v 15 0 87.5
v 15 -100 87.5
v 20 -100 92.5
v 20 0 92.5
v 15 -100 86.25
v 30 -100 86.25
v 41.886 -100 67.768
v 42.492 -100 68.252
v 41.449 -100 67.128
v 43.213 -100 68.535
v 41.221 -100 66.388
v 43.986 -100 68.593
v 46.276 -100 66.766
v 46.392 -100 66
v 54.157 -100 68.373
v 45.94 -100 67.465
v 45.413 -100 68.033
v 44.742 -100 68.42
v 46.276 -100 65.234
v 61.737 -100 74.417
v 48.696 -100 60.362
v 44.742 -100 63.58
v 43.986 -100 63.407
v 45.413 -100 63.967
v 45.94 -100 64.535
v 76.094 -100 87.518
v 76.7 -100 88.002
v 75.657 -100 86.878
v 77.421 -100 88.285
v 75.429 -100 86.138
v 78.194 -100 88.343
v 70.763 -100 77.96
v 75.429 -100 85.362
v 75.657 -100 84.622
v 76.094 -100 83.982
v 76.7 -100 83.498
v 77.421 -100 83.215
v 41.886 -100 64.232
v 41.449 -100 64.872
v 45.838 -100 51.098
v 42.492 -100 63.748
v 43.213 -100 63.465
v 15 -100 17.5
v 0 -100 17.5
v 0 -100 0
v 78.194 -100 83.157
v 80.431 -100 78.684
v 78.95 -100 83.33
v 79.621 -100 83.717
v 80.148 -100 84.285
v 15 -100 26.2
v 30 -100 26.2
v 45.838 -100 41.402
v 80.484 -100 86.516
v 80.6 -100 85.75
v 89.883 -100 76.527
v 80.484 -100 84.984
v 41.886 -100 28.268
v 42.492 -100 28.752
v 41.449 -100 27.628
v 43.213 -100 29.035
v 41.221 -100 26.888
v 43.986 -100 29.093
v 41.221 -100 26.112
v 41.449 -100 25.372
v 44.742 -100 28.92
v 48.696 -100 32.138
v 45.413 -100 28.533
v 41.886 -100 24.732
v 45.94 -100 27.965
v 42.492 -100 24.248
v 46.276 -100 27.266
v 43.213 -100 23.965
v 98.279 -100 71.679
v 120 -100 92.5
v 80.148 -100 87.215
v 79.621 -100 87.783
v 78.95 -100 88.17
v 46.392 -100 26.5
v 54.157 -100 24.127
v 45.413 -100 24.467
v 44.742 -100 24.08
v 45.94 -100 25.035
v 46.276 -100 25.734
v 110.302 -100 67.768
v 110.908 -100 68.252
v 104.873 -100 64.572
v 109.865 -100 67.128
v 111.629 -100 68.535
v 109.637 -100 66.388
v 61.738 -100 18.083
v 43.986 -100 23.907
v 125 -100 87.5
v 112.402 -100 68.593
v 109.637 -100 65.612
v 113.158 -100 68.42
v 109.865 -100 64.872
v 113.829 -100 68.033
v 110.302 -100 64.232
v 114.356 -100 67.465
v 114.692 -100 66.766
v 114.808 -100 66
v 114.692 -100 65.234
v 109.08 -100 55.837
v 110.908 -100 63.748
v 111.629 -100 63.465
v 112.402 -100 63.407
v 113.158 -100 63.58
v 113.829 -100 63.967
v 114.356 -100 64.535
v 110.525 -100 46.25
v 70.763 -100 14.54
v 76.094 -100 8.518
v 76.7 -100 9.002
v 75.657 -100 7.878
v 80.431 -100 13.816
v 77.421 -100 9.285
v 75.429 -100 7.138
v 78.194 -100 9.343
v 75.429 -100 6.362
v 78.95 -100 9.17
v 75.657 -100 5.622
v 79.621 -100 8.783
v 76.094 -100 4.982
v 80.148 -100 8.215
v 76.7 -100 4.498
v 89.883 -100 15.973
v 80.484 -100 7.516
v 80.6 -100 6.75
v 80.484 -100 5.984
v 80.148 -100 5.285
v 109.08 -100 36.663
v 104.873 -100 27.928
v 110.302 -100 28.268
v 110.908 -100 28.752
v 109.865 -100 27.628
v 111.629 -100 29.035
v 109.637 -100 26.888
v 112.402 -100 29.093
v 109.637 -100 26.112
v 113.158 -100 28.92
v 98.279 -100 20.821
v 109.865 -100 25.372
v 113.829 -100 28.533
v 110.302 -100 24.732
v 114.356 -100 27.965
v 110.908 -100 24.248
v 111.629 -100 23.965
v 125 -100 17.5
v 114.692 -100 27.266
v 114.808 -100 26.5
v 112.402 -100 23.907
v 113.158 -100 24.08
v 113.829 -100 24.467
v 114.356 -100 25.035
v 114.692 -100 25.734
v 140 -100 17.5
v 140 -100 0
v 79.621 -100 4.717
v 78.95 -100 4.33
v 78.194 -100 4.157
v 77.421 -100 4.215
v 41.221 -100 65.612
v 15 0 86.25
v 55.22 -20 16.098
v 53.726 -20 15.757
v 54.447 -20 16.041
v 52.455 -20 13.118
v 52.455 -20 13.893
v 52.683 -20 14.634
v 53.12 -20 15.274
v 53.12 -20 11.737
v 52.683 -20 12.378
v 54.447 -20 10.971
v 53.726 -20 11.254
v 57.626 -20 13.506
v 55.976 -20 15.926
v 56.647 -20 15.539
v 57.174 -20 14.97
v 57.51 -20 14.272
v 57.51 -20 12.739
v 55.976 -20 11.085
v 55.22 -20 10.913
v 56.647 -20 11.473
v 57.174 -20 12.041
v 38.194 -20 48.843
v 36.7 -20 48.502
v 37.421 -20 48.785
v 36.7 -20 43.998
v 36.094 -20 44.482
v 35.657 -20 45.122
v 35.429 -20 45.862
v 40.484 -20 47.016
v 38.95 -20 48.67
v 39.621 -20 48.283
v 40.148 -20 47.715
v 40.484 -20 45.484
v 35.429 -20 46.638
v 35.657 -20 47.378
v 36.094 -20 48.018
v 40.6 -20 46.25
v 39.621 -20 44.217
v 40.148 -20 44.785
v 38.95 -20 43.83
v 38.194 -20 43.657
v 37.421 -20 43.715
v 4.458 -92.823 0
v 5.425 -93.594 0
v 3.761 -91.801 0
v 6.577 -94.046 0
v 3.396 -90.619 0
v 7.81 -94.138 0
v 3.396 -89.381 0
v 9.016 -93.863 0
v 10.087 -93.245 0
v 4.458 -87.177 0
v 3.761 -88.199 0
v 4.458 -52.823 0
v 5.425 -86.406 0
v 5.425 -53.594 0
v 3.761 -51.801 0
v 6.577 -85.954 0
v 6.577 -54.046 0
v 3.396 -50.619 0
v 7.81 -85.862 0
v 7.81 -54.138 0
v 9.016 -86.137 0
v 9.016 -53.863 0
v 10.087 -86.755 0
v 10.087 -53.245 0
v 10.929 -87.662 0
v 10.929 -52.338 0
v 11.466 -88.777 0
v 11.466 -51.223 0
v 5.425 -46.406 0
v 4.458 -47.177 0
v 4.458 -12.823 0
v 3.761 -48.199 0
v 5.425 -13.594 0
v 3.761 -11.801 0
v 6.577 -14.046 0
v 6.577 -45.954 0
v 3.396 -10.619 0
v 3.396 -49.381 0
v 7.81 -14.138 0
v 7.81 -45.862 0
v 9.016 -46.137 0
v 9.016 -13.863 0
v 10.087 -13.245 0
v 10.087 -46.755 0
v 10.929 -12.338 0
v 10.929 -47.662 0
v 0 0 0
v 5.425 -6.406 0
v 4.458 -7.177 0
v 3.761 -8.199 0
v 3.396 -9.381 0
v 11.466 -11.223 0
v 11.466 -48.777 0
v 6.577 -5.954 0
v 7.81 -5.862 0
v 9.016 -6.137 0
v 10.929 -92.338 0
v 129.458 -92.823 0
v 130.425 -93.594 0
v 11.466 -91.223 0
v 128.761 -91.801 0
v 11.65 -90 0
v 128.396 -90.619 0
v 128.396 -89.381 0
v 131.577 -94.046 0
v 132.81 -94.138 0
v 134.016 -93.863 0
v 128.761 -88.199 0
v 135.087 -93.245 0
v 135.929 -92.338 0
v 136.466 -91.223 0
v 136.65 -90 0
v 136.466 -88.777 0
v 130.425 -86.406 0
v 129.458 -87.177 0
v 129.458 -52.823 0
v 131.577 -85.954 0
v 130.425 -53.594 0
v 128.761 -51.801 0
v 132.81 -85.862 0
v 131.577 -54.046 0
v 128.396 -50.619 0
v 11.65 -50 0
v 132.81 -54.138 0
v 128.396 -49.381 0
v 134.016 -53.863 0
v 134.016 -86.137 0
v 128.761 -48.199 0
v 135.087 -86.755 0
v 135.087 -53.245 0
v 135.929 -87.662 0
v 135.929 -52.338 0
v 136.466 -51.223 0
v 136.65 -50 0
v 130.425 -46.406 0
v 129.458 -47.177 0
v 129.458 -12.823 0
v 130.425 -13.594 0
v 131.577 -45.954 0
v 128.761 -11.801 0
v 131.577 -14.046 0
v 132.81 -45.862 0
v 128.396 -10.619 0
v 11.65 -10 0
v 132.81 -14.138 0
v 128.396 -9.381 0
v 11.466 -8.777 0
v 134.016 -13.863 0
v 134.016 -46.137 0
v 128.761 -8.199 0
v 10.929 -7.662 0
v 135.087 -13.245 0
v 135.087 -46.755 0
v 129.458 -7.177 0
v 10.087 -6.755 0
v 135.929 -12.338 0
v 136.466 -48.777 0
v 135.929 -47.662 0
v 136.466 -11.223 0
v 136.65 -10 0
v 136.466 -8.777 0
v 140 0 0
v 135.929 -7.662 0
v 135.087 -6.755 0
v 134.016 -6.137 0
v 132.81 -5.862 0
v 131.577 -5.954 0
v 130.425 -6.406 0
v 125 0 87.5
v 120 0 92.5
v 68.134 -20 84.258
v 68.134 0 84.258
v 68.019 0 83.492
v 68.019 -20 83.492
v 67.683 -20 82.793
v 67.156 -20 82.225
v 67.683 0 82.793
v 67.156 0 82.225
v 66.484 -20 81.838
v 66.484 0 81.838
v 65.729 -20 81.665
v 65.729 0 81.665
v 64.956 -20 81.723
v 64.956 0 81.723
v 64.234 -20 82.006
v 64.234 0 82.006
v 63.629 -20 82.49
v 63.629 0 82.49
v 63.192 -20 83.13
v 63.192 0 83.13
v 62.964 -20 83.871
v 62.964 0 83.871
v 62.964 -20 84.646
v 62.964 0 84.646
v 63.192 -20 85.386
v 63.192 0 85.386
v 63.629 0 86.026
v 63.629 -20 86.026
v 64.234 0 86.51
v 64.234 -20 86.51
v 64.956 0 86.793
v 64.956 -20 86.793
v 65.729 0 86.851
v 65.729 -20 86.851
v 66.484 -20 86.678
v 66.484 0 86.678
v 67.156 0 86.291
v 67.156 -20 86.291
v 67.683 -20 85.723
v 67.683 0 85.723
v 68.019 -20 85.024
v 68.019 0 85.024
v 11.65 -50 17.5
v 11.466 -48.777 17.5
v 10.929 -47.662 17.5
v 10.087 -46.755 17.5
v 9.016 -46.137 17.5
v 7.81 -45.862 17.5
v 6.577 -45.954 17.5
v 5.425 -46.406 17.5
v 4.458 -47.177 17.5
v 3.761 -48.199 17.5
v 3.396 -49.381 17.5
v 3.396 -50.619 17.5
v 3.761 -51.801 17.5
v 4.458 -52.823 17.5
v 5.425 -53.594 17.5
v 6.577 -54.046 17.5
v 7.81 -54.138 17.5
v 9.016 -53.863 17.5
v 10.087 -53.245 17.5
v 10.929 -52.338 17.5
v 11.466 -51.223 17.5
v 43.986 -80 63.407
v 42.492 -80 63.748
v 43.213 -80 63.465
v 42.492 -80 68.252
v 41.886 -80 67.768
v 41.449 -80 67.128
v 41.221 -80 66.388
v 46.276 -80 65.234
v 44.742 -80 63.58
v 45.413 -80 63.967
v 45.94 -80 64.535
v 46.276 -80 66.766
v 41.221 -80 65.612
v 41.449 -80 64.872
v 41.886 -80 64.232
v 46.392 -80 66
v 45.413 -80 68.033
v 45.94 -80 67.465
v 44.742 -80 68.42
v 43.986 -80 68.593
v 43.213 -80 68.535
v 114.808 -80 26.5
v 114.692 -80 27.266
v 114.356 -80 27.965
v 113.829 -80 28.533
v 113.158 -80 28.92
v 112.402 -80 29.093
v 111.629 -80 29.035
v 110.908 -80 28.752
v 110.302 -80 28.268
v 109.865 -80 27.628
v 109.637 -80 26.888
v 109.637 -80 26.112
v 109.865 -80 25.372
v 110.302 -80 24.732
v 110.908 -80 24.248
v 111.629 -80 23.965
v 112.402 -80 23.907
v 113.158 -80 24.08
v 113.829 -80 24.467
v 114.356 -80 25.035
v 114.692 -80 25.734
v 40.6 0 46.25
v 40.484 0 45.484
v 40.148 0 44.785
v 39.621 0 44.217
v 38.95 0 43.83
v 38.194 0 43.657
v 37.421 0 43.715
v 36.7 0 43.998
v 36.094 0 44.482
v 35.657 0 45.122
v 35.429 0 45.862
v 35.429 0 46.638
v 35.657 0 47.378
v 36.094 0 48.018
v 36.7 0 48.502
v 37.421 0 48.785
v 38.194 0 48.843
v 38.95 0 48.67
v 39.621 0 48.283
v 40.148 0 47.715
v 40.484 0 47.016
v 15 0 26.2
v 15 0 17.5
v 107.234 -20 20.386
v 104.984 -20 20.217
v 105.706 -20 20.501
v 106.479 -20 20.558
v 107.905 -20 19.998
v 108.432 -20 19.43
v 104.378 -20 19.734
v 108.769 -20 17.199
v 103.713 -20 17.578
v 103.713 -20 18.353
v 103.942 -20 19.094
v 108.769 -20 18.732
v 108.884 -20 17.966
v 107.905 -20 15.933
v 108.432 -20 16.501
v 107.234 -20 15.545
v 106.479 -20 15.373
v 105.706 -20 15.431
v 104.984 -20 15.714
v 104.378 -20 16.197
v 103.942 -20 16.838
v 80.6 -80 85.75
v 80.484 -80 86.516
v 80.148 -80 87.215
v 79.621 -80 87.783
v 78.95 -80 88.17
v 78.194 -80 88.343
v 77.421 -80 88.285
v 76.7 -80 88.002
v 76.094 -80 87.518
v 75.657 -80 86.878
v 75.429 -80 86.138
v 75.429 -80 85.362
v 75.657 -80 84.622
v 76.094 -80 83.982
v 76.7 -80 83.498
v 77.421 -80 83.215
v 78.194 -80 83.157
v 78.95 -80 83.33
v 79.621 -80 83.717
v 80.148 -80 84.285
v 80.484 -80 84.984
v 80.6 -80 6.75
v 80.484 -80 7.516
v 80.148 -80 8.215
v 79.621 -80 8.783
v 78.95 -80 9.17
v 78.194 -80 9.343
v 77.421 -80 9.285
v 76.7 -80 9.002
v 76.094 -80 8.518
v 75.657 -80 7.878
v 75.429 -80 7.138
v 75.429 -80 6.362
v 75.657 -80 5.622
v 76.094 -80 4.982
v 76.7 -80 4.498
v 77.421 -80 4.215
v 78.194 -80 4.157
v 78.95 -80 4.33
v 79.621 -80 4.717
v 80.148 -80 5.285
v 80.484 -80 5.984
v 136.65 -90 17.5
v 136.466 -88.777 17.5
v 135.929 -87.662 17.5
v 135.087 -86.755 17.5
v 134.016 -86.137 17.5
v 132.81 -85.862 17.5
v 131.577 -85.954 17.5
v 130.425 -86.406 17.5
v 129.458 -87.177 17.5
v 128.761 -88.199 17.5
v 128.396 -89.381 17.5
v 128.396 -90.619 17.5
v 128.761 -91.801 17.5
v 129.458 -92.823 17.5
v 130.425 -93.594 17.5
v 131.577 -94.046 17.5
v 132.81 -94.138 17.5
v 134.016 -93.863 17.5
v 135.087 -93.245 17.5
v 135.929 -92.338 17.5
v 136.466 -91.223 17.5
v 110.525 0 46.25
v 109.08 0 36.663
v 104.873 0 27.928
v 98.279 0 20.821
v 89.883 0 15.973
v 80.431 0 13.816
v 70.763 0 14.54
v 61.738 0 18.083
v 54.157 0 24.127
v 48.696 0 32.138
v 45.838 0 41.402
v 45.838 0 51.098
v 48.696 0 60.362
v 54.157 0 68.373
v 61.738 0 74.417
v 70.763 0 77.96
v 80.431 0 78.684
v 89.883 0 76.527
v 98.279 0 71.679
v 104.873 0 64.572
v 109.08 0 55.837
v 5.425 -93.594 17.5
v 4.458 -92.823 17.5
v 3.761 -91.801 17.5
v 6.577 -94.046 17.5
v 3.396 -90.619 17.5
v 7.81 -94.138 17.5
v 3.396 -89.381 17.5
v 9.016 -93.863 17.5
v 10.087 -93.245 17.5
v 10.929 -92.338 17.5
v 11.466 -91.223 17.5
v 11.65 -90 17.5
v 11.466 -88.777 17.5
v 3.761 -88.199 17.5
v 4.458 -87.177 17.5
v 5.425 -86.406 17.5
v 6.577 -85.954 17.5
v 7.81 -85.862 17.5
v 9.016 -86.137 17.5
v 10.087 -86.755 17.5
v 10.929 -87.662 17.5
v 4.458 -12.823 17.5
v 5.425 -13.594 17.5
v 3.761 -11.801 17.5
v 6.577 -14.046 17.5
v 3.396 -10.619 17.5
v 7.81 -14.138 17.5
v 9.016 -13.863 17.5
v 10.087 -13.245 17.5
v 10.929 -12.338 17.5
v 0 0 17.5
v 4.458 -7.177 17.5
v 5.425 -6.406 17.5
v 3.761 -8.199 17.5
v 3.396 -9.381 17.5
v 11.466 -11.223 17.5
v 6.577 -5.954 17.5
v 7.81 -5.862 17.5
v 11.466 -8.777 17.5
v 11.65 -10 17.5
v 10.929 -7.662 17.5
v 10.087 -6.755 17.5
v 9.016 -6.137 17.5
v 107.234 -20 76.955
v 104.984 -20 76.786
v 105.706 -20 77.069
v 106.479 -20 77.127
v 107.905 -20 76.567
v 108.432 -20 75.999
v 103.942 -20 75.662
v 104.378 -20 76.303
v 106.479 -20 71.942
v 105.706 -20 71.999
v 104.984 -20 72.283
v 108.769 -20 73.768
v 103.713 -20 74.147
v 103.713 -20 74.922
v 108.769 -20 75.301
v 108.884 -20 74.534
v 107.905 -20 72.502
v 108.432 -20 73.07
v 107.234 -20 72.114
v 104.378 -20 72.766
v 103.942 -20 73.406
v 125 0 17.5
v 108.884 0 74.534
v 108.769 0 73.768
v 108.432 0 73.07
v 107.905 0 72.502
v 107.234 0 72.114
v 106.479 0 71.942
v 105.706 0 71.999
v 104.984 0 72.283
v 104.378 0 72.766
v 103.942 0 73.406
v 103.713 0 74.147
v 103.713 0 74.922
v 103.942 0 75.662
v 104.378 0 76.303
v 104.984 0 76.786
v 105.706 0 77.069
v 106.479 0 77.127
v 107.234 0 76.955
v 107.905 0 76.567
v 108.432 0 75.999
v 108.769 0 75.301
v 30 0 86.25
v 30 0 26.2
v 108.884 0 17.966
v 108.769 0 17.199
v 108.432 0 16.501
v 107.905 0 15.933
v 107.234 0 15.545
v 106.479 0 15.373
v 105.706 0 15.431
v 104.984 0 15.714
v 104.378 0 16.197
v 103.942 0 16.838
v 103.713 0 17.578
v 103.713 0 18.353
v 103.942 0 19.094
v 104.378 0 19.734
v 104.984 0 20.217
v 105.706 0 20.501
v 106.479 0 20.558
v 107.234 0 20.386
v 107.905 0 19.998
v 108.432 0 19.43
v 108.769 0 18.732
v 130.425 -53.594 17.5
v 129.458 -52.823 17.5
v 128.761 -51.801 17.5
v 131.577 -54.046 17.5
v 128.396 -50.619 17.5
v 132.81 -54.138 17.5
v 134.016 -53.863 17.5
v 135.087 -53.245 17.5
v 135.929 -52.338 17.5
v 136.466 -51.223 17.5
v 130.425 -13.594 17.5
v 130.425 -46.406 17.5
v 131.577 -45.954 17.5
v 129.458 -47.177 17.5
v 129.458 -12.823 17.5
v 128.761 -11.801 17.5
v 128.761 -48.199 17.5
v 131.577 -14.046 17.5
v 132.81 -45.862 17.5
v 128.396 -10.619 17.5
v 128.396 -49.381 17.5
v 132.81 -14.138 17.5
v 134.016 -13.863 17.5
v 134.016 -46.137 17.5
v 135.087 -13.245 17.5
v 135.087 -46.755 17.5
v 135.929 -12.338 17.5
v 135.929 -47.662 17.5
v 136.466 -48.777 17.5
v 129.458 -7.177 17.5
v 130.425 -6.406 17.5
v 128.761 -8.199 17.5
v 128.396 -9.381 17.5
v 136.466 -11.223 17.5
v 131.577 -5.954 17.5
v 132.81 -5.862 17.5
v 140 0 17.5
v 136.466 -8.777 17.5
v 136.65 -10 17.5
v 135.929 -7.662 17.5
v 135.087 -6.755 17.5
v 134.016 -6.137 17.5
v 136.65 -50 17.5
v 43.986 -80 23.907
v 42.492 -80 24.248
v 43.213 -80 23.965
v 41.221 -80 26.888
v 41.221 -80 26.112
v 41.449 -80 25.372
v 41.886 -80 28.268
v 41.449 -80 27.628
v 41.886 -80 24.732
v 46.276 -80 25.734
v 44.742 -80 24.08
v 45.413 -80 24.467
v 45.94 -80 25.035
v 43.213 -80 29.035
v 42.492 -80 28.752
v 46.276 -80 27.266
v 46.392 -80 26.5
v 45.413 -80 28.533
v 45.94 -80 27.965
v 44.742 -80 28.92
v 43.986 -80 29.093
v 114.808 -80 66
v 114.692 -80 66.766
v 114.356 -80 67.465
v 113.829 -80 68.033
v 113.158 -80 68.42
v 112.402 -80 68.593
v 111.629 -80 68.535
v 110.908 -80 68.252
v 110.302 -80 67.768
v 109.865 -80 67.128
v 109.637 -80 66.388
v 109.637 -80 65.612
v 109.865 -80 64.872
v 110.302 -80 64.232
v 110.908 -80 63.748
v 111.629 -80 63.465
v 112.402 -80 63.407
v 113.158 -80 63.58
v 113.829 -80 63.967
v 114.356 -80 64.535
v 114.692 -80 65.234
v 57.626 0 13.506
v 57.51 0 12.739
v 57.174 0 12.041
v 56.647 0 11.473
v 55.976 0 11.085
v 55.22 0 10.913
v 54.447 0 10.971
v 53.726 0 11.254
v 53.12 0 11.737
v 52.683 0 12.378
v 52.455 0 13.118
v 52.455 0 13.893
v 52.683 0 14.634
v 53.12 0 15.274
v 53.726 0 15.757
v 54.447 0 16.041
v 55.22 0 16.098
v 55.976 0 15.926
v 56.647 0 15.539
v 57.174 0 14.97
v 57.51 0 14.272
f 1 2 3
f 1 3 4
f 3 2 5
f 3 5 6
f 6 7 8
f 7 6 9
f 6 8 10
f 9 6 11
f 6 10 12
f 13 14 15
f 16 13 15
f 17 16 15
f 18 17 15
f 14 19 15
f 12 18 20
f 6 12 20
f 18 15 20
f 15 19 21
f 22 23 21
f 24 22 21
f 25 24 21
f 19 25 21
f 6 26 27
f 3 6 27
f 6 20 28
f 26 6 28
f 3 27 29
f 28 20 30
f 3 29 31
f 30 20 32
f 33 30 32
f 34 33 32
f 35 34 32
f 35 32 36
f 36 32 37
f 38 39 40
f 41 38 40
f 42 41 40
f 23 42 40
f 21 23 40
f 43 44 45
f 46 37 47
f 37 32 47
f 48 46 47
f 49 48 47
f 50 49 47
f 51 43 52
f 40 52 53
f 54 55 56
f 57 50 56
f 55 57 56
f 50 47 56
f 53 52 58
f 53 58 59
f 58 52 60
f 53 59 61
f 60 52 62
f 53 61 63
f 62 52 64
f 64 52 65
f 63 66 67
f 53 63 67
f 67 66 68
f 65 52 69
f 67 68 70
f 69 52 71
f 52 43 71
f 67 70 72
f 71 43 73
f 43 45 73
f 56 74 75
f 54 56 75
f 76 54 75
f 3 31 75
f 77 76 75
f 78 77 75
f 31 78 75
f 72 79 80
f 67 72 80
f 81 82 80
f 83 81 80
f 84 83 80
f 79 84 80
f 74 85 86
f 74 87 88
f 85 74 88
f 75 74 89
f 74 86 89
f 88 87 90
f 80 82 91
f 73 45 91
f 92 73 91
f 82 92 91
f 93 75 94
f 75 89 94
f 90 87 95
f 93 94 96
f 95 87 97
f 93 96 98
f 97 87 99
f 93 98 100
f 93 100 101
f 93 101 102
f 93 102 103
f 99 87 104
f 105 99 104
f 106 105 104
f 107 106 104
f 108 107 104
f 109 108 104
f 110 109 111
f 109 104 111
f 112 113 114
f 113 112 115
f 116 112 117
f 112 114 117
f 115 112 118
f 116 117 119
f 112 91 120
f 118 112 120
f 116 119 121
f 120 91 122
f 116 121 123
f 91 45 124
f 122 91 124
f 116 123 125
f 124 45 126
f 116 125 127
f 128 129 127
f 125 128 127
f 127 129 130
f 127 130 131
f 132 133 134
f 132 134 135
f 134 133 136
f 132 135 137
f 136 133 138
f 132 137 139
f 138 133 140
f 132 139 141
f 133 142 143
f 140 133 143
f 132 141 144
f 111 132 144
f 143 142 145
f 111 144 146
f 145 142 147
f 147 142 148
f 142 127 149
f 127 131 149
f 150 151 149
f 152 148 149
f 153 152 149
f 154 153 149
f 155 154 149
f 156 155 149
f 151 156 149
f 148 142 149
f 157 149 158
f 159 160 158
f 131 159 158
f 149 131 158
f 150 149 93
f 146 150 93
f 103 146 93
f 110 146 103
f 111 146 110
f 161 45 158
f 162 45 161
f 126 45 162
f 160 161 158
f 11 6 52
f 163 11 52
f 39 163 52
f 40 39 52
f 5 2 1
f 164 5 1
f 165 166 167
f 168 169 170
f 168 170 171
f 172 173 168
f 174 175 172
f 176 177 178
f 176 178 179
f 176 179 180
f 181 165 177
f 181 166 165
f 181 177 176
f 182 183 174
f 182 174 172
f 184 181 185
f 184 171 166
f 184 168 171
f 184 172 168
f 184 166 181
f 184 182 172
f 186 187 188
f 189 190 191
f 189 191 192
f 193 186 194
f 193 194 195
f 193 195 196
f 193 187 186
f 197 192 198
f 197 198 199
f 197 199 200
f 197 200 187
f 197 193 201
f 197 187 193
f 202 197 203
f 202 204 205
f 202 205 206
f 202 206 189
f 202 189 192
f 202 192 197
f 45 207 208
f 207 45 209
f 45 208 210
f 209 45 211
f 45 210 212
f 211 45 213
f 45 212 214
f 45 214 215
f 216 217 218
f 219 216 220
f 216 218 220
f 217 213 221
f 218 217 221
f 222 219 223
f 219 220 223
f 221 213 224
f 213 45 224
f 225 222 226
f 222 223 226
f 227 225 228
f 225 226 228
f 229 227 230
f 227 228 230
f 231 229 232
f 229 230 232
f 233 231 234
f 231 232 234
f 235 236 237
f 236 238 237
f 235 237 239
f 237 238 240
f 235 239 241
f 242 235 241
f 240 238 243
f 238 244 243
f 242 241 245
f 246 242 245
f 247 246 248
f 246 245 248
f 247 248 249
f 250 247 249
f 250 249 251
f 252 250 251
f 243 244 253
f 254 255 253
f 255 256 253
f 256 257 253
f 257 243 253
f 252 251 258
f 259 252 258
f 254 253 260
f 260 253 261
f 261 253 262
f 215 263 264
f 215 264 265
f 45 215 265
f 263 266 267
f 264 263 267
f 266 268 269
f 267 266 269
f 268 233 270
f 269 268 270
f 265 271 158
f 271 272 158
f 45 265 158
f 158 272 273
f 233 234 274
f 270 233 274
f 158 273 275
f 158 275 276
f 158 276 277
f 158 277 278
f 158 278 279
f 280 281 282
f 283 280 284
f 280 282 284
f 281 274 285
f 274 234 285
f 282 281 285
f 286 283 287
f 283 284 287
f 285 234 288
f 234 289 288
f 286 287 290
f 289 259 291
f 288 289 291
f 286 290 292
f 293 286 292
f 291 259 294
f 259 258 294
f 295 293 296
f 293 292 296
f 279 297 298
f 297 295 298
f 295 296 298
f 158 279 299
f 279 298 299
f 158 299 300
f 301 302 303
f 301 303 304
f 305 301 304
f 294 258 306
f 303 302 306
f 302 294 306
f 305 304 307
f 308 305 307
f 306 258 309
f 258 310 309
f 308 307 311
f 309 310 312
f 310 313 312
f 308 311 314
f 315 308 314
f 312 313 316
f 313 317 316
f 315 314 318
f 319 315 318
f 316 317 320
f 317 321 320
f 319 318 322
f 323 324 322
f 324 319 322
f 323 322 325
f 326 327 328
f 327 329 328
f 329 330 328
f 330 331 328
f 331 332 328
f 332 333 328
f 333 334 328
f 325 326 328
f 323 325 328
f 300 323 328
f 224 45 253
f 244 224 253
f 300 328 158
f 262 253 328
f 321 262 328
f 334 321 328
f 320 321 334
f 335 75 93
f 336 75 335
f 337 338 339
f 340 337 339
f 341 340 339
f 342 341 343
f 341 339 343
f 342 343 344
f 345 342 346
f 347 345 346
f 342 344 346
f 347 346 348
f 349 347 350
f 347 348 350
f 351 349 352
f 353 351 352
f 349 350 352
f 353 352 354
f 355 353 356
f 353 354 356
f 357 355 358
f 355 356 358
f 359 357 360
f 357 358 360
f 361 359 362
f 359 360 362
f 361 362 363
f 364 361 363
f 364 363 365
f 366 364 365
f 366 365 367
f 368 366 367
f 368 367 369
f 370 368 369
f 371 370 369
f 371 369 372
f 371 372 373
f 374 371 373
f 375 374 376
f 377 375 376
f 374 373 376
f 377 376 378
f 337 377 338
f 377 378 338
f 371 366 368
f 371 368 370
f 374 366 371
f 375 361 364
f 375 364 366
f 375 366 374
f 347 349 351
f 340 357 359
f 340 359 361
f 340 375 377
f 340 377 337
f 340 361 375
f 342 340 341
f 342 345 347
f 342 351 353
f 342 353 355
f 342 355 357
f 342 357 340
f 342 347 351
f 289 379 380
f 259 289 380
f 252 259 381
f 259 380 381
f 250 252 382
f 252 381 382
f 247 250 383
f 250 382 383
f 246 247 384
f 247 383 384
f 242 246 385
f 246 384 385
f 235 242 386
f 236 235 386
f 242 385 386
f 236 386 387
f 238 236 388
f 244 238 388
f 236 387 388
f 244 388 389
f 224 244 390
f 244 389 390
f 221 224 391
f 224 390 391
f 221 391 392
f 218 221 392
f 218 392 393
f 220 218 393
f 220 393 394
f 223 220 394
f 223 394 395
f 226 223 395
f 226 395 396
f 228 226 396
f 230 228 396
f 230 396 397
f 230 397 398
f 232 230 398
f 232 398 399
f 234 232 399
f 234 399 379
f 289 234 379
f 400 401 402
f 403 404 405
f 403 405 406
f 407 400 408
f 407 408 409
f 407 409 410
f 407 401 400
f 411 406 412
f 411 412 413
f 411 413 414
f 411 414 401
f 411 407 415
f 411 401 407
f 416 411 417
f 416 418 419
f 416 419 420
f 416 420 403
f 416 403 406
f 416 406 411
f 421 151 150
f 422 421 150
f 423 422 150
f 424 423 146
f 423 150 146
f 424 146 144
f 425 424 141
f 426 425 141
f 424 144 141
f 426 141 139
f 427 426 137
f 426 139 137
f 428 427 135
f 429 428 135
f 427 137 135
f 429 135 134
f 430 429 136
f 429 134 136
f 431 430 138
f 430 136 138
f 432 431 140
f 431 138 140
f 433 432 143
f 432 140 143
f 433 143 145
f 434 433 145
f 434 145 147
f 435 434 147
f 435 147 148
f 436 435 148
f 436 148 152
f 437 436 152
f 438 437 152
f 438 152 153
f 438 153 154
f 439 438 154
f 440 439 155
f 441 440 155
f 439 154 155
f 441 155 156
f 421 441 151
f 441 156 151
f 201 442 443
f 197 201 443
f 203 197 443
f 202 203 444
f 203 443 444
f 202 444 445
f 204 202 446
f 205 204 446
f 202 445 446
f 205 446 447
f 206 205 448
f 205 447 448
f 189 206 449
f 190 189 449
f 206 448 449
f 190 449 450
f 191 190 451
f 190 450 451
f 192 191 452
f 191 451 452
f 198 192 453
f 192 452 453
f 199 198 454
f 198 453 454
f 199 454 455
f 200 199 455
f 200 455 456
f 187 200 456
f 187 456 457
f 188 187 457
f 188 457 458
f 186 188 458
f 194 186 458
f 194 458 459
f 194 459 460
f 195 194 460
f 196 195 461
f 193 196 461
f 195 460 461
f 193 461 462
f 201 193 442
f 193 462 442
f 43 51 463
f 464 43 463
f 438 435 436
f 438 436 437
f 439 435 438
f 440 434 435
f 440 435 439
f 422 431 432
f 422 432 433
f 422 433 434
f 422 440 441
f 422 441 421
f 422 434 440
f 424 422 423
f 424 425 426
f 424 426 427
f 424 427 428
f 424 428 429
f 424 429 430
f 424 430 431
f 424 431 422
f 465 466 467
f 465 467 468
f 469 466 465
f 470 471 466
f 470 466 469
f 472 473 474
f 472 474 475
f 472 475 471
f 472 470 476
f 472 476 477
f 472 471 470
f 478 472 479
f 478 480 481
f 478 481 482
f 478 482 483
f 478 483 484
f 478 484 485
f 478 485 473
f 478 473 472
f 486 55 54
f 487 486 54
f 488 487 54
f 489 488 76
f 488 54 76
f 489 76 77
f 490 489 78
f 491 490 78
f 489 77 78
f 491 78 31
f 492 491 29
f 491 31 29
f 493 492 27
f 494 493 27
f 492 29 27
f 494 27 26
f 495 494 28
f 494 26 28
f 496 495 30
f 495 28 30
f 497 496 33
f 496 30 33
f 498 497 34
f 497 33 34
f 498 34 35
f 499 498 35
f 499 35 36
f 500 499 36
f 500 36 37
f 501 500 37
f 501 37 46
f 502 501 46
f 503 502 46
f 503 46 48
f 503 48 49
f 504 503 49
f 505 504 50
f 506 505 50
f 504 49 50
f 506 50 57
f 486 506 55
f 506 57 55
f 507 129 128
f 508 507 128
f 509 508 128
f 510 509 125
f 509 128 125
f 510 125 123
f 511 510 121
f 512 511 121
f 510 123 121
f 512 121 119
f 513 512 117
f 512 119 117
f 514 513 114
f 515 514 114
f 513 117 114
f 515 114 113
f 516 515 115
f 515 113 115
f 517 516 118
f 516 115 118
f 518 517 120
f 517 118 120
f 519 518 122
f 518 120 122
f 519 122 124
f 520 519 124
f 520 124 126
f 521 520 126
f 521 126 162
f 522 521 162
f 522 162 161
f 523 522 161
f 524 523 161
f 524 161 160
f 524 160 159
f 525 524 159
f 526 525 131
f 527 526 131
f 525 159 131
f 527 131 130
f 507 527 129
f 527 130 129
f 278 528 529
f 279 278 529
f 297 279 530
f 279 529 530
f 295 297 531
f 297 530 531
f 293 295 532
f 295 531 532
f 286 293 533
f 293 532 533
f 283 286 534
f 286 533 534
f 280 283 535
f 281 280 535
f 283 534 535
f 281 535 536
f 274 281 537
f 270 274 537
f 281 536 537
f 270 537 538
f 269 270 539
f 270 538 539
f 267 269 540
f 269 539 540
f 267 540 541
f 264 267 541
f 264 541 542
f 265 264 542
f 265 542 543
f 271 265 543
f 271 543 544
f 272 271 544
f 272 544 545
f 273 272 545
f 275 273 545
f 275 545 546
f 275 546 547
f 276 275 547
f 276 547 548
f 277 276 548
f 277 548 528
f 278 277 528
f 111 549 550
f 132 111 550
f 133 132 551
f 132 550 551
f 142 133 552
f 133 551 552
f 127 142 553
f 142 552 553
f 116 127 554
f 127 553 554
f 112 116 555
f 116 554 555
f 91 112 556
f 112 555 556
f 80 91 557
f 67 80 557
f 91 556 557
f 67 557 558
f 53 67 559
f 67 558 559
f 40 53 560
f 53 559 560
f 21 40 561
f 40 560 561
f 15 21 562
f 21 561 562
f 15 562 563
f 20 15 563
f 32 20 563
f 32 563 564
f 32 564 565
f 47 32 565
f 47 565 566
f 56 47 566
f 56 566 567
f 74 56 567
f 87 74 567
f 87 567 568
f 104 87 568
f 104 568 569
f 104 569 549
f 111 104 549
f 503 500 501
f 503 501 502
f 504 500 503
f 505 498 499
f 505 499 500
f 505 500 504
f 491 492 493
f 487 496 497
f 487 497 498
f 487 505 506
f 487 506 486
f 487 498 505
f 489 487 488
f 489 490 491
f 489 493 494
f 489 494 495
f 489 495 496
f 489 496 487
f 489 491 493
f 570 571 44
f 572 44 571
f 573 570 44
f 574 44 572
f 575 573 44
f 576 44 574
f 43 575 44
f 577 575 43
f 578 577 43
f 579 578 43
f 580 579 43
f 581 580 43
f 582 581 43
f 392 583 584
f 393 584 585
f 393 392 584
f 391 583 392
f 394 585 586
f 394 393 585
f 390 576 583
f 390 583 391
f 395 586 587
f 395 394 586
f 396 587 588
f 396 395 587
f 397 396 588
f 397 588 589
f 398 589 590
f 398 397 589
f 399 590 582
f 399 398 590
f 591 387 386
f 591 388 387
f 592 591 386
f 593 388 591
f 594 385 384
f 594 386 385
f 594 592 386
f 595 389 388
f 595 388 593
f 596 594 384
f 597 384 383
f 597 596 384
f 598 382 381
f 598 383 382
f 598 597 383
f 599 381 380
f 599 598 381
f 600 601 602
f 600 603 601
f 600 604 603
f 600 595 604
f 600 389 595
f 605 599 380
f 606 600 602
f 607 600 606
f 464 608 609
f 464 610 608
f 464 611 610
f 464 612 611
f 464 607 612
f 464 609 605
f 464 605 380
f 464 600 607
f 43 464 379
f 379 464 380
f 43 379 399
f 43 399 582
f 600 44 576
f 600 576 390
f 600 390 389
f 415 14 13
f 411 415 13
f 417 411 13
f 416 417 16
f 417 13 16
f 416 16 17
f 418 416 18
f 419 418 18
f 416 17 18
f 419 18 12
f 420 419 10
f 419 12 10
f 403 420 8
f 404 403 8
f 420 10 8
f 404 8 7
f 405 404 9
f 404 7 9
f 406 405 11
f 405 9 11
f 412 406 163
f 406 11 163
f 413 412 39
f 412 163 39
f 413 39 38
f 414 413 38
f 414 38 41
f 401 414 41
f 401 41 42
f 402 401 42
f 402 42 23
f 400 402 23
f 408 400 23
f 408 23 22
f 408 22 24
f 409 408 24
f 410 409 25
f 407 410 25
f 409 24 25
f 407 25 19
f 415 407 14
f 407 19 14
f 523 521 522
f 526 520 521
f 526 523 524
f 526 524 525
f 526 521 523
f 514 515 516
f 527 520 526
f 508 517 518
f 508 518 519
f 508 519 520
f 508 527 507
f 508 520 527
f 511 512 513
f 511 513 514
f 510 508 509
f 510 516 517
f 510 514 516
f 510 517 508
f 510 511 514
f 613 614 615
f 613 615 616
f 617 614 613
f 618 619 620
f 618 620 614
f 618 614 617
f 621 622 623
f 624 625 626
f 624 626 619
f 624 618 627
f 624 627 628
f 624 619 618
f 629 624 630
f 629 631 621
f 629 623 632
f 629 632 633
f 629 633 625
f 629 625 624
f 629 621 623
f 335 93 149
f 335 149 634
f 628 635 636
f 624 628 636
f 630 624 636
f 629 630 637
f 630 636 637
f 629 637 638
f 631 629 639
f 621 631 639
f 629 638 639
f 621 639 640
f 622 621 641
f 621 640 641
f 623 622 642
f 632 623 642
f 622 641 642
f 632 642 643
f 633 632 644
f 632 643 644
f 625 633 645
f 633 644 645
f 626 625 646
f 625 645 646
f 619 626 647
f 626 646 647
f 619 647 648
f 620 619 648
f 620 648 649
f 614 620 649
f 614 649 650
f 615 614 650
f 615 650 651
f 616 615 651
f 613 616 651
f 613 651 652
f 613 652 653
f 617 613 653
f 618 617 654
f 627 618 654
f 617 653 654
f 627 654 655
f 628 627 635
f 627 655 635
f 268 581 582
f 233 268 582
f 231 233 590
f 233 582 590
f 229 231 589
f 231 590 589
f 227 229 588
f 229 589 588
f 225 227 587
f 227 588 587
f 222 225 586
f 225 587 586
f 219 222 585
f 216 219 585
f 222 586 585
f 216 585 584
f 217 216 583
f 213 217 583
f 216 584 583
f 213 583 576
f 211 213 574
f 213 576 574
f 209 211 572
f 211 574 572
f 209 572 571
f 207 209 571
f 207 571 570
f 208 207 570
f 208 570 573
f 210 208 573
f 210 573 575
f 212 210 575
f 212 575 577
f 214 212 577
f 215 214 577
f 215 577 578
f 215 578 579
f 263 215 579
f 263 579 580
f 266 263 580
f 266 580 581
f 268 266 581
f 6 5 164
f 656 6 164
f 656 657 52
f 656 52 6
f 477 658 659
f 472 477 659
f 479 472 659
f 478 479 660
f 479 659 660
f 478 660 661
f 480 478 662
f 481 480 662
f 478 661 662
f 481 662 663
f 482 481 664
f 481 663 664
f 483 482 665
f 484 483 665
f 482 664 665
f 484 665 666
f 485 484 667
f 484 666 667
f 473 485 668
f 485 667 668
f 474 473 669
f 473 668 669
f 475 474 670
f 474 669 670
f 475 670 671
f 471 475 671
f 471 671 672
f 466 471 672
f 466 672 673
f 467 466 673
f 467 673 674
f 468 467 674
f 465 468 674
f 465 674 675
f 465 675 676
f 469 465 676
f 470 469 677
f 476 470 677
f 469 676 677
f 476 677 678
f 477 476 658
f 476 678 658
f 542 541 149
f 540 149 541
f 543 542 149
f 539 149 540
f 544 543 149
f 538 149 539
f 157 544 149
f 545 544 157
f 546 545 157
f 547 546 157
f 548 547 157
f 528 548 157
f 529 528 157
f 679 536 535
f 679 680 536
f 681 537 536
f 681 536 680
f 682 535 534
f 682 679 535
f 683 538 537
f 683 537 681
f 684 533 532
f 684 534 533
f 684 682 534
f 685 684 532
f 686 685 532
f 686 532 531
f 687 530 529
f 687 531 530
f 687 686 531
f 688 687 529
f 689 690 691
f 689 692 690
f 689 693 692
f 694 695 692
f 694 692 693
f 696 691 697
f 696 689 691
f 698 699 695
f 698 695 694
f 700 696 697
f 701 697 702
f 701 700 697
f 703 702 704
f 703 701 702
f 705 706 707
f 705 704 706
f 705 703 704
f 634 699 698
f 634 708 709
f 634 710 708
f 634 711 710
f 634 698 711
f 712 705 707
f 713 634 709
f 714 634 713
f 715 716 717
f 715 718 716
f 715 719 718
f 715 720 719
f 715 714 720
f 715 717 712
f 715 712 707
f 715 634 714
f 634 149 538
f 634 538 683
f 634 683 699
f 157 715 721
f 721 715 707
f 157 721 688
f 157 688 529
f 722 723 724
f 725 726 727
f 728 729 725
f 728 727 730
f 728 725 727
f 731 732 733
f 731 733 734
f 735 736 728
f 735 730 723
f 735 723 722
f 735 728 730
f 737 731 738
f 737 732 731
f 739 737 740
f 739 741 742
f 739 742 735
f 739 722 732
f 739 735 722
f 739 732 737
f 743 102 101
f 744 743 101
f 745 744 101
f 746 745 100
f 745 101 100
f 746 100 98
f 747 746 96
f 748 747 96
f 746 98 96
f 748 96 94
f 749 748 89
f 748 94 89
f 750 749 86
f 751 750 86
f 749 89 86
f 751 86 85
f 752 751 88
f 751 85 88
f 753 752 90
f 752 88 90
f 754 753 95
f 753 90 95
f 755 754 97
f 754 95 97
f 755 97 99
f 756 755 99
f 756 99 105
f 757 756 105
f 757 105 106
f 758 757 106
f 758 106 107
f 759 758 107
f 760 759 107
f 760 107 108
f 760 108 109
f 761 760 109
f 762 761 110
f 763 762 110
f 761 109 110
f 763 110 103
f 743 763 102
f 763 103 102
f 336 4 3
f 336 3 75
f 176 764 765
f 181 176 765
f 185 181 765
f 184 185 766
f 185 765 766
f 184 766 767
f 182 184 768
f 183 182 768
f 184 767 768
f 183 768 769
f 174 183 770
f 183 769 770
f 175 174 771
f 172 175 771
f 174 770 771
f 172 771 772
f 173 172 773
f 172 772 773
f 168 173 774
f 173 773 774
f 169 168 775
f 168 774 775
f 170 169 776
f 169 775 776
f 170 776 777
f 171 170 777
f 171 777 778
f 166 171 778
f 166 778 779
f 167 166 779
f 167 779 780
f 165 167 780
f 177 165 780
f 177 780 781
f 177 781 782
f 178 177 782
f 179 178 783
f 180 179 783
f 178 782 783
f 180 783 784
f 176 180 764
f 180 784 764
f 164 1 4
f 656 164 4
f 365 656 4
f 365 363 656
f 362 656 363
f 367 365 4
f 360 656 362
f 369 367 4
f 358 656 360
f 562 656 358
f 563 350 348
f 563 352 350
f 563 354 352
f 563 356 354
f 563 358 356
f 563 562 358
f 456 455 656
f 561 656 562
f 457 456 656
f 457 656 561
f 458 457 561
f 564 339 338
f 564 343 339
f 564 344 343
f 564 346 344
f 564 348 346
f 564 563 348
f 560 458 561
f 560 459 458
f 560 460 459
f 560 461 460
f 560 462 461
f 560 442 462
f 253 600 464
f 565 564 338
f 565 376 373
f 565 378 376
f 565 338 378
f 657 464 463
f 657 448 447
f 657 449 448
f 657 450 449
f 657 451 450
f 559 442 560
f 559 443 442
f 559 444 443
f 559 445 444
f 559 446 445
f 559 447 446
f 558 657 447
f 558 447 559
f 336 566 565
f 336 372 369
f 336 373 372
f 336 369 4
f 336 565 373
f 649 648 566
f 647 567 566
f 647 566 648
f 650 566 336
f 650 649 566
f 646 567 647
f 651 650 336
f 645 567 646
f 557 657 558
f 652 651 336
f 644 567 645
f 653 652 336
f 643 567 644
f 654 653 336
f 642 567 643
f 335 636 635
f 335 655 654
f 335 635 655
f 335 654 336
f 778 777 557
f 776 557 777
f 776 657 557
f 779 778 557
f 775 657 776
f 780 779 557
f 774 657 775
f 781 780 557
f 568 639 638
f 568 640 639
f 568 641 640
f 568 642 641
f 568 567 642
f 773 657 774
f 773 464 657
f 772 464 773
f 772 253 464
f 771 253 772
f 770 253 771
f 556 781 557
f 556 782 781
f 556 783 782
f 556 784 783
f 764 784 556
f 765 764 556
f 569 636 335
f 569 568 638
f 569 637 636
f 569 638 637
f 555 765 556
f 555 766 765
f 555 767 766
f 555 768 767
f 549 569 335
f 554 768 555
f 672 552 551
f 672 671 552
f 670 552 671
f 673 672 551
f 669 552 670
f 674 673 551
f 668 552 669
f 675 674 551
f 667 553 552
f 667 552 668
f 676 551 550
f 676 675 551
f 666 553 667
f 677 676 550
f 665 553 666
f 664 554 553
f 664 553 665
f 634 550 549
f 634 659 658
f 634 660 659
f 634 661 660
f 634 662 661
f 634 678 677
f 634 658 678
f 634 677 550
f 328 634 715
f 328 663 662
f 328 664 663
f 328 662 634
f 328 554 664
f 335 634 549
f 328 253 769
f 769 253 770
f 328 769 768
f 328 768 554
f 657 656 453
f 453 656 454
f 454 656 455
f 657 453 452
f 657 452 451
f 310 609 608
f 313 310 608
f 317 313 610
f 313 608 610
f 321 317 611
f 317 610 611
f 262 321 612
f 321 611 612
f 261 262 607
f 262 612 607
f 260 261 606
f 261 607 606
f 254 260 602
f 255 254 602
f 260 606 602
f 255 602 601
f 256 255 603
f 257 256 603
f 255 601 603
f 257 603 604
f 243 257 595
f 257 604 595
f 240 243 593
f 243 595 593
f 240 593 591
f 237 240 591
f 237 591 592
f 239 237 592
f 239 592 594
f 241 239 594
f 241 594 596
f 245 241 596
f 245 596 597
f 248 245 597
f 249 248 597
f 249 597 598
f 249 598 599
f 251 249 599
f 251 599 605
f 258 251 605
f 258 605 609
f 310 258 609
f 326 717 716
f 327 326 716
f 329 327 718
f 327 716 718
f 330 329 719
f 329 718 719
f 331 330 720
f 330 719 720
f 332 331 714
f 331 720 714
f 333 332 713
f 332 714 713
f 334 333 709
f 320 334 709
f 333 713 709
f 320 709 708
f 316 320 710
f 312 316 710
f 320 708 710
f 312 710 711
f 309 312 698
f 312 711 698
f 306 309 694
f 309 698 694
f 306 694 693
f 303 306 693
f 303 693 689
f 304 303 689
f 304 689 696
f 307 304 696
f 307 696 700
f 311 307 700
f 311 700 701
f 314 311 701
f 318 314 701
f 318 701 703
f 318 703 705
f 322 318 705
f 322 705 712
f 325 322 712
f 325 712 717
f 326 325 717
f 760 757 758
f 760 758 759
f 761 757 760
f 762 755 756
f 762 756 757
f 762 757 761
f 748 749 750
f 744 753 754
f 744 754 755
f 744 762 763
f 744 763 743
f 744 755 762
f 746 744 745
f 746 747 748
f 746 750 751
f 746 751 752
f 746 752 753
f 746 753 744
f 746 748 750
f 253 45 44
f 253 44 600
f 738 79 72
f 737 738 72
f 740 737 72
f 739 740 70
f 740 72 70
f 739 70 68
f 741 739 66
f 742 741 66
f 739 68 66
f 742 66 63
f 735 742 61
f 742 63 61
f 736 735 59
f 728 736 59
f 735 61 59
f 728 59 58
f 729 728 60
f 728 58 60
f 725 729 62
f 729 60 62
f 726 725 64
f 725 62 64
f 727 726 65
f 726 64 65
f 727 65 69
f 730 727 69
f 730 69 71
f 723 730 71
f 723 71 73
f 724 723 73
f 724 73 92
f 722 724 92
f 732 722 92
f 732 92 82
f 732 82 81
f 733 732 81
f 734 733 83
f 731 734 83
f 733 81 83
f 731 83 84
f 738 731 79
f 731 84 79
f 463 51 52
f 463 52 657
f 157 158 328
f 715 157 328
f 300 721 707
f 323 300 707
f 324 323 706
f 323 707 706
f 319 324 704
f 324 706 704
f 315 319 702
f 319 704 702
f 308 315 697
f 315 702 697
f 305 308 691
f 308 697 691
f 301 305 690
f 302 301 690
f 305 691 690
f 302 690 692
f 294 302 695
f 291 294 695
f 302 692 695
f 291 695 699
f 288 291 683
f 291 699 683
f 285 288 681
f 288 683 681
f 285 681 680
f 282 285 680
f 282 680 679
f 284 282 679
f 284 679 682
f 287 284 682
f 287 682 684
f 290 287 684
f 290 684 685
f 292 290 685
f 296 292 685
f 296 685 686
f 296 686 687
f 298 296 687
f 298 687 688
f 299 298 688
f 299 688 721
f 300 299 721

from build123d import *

# Parameters (mm, degrees)
SKETCH_1_W           = 140
SKETCH_1_H           = 100
EXTRUDE_1_DEPTH      = 92.5
SKETCH_2_R           = 32.525
CUT_EXTRUDE_1_DEPTH  = 101
SKETCH_3_OUTSIDE_W   = 181.068
SKETCH_3_OUTSIDE_H   = 141.068
SKETCH_3_OUTSIDE_W_2 = 110
SKETCH_3_OUTSIDE_H_2 = 100
CUT_EXTRUDE_2_DEPTH  = 75
SKETCH_5_W           = 60.05
SKETCH_5_H           = 100
CUT_EXTRUDE_3_DEPTH  = 15
CHAMFER_2_SIZE       = 5
SKETCH_6_R           = 2.6
CUT_EXTRUDE_4_DEPTH  = 20
SKETCH_9_R           = 4.15
CUT_EXTRUDE_5_DEPTH  = 18.5
SKETCH_10_R          = 2.6
CUT_EXTRUDE_6_DEPTH  = 20


with BuildPart() as part:
    # 草图1 → 凸台-拉伸1 (new body)
    with BuildSketch(Plane.XY):
        with Locations((70, -50)):
            Rectangle(SKETCH_1_W, SKETCH_1_H)
    extrude(amount=EXTRUDE_1_DEPTH)

    # 草图2 → 切除-拉伸1 (cut, through all)
    with BuildSketch(Plane(origin=(0, 0, 0), x_dir=(1, 0, 0), z_dir=(0, 1, 0))):
        with Locations((78, -46.25)):
            Circle(SKETCH_2_R)
    extrude(amount=-CUT_EXTRUDE_1_DEPTH, mode=Mode.SUBTRACT)

    # 草图3 outside → 切除-拉伸2 (cut)
    with BuildSketch(Plane.XY.offset(92.5)):
        with Locations((70, -50)):
            Rectangle(SKETCH_3_OUTSIDE_W, SKETCH_3_OUTSIDE_H)
        with Locations((70, -50)):
            Rectangle(SKETCH_3_OUTSIDE_W_2, SKETCH_3_OUTSIDE_H_2, mode=Mode.SUBTRACT)
    extrude(amount=-CUT_EXTRUDE_2_DEPTH, mode=Mode.SUBTRACT)

    # 草图5 → 切除-拉伸3 (cut)
    with BuildSketch(Plane.ZY.offset(-15)):
        with Locations((56.225, -50)):
            Rectangle(SKETCH_5_W, SKETCH_5_H)
    extrude(amount=-CUT_EXTRUDE_3_DEPTH, mode=Mode.SUBTRACT)

    # 倒角2
    chamfer_2_edges = [part.edges().sort_by_distance(p)[0] for p in [
        (15, -50, 92.5),
        (125, -50, 92.5),
    ]]
    chamfer(chamfer_2_edges, length=CHAMFER_2_SIZE)

    # 草图6 → 切除-拉伸4 (cut)
    with BuildSketch(Plane.XZ.offset(100)):
        with Locations((78, 85.75)):
            Circle(SKETCH_6_R)
        with Locations((112.208003449, 66)):
            Circle(SKETCH_6_R)
        with Locations((112.208003449, 26.5)):
            Circle(SKETCH_6_R)
        with Locations((78, 6.75)):
            Circle(SKETCH_6_R)
        with Locations((43.791996551, 26.5)):
            Circle(SKETCH_6_R)
        with Locations((43.791996551, 66)):
            Circle(SKETCH_6_R)
    extrude(amount=-CUT_EXTRUDE_4_DEPTH, mode=Mode.SUBTRACT)

    # 草图9 → 切除-拉伸5 (cut, through all)
    with BuildSketch(Plane.XY.offset(17.5)):
        with Locations((7.5, -10)):
            Circle(SKETCH_9_R)
        with Locations((132.5, -10)):
            Circle(SKETCH_9_R)
        with Locations((132.5, -50)):
            Circle(SKETCH_9_R)
        with Locations((132.5, -90)):
            Circle(SKETCH_9_R)
        with Locations((7.5, -50)):
            Circle(SKETCH_9_R)
        with Locations((7.5, -90)):
            Circle(SKETCH_9_R)
    extrude(amount=-CUT_EXTRUDE_5_DEPTH, mode=Mode.SUBTRACT)

    # 草图10 → 切除-拉伸6 (cut)
    with BuildSketch(Plane(origin=(0, 0, 0), x_dir=(1, 0, 0), z_dir=(0, 1, 0))):
        with Locations((106.284271247, -17.965728753)):
            Circle(SKETCH_10_R)
        with Locations((106.284271247, -74.534271247)):
            Circle(SKETCH_10_R)
        with Locations((38, -46.25)):
            Circle(SKETCH_10_R)
        with Locations((65.534490363, -84.258039538)):
            Circle(SKETCH_10_R)
        with Locations((55.025808003, -13.505740929)):
            Circle(SKETCH_10_R)
    extrude(amount=-CUT_EXTRUDE_6_DEPTH, mode=Mode.SUBTRACT)


solid = part.part
